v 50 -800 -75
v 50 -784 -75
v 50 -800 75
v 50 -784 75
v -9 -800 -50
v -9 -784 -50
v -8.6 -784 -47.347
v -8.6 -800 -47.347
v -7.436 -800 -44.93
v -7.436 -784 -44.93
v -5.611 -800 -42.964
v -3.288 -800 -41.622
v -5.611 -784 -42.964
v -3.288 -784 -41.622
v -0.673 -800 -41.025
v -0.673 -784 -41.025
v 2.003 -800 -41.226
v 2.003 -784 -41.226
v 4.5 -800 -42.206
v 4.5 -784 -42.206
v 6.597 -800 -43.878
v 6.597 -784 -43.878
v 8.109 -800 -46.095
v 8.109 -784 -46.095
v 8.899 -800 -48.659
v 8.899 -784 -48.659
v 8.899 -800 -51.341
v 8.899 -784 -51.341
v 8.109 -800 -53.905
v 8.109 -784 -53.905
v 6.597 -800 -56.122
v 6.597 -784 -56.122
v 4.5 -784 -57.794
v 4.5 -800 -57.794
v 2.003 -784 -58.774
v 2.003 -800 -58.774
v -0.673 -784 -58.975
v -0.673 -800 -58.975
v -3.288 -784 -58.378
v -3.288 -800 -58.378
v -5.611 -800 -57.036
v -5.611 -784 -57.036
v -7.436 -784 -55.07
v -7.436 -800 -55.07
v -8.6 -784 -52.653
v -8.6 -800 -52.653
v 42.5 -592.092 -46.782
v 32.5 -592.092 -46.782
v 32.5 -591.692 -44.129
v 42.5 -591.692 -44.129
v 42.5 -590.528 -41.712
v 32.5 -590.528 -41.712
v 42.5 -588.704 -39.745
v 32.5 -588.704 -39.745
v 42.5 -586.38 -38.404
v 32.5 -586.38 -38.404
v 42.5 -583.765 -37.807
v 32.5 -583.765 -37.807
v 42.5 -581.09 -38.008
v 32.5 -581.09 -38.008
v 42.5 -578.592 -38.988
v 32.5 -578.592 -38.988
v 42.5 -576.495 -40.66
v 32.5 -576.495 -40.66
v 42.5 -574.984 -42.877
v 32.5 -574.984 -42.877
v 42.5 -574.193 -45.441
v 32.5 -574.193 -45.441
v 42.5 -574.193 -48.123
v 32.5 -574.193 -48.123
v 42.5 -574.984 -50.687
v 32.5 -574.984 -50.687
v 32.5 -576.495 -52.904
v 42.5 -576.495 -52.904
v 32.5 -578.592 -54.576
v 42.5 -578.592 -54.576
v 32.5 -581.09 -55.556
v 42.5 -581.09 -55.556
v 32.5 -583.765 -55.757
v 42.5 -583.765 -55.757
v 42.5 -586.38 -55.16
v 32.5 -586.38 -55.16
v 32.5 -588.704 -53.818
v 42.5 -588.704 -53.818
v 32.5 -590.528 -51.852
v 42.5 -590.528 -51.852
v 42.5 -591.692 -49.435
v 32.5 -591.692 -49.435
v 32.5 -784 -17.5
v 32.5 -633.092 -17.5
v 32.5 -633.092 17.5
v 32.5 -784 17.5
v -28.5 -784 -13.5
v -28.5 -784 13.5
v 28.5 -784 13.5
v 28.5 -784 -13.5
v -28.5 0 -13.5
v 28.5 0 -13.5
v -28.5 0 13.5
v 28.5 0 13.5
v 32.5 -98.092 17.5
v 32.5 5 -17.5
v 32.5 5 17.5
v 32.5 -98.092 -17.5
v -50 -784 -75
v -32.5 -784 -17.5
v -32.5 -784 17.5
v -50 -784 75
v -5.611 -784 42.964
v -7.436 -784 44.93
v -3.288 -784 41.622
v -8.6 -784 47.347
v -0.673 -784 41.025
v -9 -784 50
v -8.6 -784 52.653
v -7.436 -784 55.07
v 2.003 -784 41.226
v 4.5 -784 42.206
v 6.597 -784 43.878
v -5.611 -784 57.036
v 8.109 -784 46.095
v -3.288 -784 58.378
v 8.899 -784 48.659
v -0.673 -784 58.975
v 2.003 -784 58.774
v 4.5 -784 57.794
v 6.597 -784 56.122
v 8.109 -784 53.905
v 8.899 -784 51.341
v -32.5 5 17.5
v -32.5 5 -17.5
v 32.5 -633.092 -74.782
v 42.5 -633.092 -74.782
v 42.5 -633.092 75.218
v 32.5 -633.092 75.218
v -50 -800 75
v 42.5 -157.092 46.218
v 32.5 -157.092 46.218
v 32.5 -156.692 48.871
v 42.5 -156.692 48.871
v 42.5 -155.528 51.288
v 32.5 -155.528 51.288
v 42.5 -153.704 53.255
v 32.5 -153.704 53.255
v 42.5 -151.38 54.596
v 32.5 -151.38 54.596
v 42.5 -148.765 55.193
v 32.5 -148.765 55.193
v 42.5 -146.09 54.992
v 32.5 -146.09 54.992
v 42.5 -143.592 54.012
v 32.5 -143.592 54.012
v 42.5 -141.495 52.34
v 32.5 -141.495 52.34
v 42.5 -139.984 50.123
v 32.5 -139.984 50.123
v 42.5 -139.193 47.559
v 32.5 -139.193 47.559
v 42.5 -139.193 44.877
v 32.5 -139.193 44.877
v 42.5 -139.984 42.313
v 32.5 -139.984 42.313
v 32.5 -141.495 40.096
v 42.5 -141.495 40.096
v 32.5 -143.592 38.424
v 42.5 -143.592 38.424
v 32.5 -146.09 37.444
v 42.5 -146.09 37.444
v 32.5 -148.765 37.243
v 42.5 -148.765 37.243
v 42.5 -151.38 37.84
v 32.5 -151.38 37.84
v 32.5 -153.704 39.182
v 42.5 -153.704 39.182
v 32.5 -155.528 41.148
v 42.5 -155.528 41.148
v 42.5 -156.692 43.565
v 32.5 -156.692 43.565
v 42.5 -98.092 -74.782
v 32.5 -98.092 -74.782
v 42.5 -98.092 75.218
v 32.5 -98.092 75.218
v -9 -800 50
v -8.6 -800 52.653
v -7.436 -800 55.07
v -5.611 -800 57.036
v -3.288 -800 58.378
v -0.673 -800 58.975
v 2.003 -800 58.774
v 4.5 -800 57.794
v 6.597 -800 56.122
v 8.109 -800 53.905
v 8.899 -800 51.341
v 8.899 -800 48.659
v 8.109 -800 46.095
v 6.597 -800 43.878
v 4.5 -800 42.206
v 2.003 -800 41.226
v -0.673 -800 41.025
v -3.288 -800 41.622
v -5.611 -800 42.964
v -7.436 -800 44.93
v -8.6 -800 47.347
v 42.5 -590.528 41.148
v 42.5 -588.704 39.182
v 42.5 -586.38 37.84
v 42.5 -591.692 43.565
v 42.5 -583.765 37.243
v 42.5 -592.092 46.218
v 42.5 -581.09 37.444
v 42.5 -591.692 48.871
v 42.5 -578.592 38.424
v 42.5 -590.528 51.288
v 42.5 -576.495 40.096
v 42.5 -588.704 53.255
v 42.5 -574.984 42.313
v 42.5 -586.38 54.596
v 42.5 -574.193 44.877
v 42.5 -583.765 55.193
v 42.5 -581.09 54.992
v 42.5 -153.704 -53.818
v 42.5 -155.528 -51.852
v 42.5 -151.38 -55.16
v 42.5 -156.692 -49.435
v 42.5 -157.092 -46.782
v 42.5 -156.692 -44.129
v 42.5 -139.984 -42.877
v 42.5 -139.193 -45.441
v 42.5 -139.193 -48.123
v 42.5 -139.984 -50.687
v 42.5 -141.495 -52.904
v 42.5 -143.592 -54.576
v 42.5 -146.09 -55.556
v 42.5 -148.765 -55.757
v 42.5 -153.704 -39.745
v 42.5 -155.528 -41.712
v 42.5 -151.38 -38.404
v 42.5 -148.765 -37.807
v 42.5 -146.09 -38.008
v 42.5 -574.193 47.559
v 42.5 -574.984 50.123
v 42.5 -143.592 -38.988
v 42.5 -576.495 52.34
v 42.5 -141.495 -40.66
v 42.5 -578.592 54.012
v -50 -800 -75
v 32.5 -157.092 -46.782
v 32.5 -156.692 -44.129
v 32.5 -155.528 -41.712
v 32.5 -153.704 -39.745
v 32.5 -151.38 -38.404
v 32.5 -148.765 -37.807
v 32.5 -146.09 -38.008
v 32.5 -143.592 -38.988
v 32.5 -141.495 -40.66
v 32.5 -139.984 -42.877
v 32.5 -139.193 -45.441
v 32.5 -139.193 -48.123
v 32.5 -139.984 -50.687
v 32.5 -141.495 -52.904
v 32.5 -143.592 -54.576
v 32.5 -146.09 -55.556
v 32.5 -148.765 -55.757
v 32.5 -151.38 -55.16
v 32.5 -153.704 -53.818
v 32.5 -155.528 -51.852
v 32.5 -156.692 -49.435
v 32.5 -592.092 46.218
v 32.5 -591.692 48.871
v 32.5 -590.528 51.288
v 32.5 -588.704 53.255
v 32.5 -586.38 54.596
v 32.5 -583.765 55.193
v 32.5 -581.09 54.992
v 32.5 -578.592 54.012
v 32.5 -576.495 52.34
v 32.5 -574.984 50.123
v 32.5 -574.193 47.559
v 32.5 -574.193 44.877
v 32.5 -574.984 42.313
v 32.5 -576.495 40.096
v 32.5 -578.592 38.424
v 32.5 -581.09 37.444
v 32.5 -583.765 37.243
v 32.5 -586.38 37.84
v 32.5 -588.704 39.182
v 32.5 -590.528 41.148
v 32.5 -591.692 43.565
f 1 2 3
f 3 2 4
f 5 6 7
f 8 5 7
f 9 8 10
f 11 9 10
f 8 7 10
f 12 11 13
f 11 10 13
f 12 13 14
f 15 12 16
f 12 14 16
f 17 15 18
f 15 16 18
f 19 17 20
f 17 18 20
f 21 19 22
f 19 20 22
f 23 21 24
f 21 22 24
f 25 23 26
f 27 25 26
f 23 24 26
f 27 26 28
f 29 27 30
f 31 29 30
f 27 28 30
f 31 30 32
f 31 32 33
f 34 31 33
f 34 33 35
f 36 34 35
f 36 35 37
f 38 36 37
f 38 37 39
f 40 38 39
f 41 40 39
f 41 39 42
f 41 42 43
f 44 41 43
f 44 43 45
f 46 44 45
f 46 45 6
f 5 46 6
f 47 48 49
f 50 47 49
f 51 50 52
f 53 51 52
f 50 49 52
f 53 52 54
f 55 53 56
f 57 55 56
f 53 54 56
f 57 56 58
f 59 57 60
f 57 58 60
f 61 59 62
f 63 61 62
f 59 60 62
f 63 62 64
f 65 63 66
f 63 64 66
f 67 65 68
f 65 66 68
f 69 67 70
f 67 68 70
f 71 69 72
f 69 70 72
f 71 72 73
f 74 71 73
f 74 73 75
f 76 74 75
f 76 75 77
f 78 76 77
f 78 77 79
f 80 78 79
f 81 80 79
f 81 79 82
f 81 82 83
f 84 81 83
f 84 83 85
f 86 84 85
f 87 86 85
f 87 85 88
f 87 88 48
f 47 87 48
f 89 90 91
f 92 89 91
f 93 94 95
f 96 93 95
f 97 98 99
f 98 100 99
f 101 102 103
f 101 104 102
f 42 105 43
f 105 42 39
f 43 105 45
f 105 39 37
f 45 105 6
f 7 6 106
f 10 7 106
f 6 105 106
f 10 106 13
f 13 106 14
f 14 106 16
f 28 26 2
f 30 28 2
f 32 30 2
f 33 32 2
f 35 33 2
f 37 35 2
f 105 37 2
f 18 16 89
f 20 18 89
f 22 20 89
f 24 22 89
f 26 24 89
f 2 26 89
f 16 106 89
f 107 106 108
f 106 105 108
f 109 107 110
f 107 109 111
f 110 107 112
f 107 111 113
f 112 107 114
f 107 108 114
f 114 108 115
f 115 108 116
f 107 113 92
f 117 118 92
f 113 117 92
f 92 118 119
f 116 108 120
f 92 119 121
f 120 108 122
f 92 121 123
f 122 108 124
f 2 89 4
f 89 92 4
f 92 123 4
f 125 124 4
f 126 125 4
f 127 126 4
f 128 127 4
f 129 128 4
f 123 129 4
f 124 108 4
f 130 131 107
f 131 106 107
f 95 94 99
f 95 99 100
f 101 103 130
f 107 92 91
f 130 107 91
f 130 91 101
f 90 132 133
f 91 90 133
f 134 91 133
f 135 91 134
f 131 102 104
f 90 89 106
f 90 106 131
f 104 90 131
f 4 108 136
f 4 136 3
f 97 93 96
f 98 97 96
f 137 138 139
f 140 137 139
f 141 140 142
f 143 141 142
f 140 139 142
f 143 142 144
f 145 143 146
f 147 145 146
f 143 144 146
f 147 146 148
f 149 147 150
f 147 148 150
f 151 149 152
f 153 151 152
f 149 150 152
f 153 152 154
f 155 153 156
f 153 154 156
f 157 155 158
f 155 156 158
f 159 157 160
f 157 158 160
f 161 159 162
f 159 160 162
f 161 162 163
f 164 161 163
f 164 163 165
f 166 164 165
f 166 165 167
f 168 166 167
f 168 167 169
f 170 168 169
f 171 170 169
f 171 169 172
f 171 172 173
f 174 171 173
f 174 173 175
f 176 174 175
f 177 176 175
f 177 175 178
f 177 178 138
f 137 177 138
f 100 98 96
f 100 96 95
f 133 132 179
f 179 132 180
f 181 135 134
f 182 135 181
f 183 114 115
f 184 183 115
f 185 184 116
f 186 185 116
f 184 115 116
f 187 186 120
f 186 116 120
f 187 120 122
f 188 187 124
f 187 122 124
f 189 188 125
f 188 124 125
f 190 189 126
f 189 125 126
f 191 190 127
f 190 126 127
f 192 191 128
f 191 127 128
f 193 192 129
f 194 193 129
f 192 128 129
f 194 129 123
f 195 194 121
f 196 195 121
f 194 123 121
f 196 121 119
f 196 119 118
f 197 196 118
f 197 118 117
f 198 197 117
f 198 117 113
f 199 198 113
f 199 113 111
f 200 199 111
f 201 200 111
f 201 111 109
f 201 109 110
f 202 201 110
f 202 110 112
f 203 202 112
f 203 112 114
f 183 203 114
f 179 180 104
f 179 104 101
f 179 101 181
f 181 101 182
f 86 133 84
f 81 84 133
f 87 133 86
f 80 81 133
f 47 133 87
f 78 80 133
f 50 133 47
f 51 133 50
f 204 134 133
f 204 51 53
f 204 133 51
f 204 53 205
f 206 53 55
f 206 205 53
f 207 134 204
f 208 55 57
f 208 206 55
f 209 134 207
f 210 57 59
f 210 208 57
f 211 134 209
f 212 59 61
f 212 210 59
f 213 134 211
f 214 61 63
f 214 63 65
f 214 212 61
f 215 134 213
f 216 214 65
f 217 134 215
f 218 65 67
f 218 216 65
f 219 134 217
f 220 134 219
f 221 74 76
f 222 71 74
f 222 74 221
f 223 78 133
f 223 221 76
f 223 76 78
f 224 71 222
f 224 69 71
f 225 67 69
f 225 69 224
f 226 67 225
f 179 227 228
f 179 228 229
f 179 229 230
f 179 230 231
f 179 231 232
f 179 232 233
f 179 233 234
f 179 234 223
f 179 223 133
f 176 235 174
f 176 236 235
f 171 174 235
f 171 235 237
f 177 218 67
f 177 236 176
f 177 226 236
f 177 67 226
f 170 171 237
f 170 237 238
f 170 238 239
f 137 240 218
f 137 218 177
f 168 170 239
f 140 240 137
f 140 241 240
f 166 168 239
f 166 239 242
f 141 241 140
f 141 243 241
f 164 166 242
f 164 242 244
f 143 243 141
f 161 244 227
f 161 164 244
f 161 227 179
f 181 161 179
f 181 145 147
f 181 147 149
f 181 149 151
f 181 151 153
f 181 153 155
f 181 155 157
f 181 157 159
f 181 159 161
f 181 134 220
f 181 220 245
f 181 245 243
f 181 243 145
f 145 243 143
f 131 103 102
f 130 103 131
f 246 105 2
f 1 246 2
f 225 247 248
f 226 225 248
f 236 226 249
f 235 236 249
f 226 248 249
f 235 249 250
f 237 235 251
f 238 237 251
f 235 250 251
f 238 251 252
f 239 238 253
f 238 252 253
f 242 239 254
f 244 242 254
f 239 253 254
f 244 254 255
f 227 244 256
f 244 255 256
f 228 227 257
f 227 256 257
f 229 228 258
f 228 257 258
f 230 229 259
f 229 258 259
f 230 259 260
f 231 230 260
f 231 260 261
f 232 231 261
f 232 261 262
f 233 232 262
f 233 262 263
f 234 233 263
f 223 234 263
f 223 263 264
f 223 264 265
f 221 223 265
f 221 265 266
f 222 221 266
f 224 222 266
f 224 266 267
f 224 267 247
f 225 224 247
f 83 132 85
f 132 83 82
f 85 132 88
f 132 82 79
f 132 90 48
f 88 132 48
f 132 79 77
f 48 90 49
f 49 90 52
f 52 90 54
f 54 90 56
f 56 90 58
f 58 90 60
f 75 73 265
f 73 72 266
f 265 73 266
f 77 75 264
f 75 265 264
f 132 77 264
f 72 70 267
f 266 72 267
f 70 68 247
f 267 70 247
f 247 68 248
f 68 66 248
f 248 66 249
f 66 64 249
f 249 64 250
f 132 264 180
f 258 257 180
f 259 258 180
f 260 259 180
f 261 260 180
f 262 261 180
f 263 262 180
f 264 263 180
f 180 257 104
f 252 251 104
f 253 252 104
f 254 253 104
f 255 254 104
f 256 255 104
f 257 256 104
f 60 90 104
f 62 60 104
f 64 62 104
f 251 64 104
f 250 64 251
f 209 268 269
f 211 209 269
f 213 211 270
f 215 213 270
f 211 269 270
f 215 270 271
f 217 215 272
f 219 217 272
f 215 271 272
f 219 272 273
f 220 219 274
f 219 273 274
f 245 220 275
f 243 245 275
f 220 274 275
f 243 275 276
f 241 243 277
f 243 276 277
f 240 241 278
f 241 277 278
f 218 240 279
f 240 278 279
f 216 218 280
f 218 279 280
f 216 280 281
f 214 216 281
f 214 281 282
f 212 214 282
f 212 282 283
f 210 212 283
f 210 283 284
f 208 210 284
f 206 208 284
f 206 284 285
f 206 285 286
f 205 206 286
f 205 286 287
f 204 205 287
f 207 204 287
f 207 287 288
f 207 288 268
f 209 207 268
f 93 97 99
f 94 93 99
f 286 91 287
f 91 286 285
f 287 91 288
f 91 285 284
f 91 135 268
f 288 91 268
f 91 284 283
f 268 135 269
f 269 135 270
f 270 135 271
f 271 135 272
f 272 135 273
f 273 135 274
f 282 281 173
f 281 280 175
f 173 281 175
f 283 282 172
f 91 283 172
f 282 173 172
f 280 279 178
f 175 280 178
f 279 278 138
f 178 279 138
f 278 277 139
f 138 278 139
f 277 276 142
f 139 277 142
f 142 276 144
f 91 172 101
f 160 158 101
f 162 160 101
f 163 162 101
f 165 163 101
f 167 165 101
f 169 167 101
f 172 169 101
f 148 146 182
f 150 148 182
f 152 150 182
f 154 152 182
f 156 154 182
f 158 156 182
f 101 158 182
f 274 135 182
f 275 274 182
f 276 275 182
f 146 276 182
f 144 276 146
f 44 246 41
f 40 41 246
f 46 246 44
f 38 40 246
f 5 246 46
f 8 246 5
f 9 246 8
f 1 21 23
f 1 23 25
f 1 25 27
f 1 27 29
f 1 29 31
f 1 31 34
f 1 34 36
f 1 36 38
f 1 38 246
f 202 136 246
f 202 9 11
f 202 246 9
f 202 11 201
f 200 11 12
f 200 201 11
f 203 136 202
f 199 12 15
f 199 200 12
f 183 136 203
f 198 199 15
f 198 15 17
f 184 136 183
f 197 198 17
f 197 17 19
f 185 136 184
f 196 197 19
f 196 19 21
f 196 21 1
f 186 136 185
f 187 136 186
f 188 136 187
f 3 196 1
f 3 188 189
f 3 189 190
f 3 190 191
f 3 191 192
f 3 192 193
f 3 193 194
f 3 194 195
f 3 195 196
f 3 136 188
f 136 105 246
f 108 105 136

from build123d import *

# Parameters (mm, degrees)
F0_W      = 65
F0_H      = 35
F0_W_2    = 57
F0_H_2    = 27
F1_DEPTH  = 784
F2_W      = 100
F2_H      = 150
F3_DEPTH  = 16
F5_D      = 18
F6_W      = 535
F6_H      = 150
F7_DEPTH  = 10
F9_D      = 18
F10_W     = 65
F10_H     = 35
F11_DEPTH = 5


with BuildPart() as f1:
    # F0 (on Front) → F1 (new body)
    with BuildSketch(Plane.XZ):
        Rectangle(F0_W, F0_H)
        Rectangle(F0_W_2, F0_H_2, mode=Mode.SUBTRACT)
    extrude(amount=F1_DEPTH)

    # F2 (on face) → F3 (join)
    with BuildSketch(Plane.XZ.offset(784)):
        Rectangle(F2_W, F2_H)
    extrude(amount=F3_DEPTH)

    # F5 (through all)
    with Locations(Plane.XZ.offset(800)):
        with Locations((0, 50), (0, -50)):
            Hole(F5_D / 2)

    # F6 (on face) → F7 (join)
    with BuildSketch(Plane.YZ.offset(32.5)):
        with Locations((-365.592288, 0.218023)):
            Rectangle(F6_W, F6_H)
    extrude(amount=F7_DEPTH)

    # F9 (through all)
    with Locations(Plane.YZ.offset(42.5)):
        with Locations((-148.092288, 46.218023), (-148.092288, -46.781977), (-583.092288, -46.781977), (-583.092288, 46.218023)):
            Hole(F9_D / 2)

    # F10 (on face) → F11 (join)
    with BuildSketch(Plane(origin=(0, 0, 0), x_dir=(-1, 0, 0), z_dir=(0, 1, 0))):
        Rectangle(F10_W, F10_H)
    extrude(amount=F11_DEPTH)


solid = f1.part
